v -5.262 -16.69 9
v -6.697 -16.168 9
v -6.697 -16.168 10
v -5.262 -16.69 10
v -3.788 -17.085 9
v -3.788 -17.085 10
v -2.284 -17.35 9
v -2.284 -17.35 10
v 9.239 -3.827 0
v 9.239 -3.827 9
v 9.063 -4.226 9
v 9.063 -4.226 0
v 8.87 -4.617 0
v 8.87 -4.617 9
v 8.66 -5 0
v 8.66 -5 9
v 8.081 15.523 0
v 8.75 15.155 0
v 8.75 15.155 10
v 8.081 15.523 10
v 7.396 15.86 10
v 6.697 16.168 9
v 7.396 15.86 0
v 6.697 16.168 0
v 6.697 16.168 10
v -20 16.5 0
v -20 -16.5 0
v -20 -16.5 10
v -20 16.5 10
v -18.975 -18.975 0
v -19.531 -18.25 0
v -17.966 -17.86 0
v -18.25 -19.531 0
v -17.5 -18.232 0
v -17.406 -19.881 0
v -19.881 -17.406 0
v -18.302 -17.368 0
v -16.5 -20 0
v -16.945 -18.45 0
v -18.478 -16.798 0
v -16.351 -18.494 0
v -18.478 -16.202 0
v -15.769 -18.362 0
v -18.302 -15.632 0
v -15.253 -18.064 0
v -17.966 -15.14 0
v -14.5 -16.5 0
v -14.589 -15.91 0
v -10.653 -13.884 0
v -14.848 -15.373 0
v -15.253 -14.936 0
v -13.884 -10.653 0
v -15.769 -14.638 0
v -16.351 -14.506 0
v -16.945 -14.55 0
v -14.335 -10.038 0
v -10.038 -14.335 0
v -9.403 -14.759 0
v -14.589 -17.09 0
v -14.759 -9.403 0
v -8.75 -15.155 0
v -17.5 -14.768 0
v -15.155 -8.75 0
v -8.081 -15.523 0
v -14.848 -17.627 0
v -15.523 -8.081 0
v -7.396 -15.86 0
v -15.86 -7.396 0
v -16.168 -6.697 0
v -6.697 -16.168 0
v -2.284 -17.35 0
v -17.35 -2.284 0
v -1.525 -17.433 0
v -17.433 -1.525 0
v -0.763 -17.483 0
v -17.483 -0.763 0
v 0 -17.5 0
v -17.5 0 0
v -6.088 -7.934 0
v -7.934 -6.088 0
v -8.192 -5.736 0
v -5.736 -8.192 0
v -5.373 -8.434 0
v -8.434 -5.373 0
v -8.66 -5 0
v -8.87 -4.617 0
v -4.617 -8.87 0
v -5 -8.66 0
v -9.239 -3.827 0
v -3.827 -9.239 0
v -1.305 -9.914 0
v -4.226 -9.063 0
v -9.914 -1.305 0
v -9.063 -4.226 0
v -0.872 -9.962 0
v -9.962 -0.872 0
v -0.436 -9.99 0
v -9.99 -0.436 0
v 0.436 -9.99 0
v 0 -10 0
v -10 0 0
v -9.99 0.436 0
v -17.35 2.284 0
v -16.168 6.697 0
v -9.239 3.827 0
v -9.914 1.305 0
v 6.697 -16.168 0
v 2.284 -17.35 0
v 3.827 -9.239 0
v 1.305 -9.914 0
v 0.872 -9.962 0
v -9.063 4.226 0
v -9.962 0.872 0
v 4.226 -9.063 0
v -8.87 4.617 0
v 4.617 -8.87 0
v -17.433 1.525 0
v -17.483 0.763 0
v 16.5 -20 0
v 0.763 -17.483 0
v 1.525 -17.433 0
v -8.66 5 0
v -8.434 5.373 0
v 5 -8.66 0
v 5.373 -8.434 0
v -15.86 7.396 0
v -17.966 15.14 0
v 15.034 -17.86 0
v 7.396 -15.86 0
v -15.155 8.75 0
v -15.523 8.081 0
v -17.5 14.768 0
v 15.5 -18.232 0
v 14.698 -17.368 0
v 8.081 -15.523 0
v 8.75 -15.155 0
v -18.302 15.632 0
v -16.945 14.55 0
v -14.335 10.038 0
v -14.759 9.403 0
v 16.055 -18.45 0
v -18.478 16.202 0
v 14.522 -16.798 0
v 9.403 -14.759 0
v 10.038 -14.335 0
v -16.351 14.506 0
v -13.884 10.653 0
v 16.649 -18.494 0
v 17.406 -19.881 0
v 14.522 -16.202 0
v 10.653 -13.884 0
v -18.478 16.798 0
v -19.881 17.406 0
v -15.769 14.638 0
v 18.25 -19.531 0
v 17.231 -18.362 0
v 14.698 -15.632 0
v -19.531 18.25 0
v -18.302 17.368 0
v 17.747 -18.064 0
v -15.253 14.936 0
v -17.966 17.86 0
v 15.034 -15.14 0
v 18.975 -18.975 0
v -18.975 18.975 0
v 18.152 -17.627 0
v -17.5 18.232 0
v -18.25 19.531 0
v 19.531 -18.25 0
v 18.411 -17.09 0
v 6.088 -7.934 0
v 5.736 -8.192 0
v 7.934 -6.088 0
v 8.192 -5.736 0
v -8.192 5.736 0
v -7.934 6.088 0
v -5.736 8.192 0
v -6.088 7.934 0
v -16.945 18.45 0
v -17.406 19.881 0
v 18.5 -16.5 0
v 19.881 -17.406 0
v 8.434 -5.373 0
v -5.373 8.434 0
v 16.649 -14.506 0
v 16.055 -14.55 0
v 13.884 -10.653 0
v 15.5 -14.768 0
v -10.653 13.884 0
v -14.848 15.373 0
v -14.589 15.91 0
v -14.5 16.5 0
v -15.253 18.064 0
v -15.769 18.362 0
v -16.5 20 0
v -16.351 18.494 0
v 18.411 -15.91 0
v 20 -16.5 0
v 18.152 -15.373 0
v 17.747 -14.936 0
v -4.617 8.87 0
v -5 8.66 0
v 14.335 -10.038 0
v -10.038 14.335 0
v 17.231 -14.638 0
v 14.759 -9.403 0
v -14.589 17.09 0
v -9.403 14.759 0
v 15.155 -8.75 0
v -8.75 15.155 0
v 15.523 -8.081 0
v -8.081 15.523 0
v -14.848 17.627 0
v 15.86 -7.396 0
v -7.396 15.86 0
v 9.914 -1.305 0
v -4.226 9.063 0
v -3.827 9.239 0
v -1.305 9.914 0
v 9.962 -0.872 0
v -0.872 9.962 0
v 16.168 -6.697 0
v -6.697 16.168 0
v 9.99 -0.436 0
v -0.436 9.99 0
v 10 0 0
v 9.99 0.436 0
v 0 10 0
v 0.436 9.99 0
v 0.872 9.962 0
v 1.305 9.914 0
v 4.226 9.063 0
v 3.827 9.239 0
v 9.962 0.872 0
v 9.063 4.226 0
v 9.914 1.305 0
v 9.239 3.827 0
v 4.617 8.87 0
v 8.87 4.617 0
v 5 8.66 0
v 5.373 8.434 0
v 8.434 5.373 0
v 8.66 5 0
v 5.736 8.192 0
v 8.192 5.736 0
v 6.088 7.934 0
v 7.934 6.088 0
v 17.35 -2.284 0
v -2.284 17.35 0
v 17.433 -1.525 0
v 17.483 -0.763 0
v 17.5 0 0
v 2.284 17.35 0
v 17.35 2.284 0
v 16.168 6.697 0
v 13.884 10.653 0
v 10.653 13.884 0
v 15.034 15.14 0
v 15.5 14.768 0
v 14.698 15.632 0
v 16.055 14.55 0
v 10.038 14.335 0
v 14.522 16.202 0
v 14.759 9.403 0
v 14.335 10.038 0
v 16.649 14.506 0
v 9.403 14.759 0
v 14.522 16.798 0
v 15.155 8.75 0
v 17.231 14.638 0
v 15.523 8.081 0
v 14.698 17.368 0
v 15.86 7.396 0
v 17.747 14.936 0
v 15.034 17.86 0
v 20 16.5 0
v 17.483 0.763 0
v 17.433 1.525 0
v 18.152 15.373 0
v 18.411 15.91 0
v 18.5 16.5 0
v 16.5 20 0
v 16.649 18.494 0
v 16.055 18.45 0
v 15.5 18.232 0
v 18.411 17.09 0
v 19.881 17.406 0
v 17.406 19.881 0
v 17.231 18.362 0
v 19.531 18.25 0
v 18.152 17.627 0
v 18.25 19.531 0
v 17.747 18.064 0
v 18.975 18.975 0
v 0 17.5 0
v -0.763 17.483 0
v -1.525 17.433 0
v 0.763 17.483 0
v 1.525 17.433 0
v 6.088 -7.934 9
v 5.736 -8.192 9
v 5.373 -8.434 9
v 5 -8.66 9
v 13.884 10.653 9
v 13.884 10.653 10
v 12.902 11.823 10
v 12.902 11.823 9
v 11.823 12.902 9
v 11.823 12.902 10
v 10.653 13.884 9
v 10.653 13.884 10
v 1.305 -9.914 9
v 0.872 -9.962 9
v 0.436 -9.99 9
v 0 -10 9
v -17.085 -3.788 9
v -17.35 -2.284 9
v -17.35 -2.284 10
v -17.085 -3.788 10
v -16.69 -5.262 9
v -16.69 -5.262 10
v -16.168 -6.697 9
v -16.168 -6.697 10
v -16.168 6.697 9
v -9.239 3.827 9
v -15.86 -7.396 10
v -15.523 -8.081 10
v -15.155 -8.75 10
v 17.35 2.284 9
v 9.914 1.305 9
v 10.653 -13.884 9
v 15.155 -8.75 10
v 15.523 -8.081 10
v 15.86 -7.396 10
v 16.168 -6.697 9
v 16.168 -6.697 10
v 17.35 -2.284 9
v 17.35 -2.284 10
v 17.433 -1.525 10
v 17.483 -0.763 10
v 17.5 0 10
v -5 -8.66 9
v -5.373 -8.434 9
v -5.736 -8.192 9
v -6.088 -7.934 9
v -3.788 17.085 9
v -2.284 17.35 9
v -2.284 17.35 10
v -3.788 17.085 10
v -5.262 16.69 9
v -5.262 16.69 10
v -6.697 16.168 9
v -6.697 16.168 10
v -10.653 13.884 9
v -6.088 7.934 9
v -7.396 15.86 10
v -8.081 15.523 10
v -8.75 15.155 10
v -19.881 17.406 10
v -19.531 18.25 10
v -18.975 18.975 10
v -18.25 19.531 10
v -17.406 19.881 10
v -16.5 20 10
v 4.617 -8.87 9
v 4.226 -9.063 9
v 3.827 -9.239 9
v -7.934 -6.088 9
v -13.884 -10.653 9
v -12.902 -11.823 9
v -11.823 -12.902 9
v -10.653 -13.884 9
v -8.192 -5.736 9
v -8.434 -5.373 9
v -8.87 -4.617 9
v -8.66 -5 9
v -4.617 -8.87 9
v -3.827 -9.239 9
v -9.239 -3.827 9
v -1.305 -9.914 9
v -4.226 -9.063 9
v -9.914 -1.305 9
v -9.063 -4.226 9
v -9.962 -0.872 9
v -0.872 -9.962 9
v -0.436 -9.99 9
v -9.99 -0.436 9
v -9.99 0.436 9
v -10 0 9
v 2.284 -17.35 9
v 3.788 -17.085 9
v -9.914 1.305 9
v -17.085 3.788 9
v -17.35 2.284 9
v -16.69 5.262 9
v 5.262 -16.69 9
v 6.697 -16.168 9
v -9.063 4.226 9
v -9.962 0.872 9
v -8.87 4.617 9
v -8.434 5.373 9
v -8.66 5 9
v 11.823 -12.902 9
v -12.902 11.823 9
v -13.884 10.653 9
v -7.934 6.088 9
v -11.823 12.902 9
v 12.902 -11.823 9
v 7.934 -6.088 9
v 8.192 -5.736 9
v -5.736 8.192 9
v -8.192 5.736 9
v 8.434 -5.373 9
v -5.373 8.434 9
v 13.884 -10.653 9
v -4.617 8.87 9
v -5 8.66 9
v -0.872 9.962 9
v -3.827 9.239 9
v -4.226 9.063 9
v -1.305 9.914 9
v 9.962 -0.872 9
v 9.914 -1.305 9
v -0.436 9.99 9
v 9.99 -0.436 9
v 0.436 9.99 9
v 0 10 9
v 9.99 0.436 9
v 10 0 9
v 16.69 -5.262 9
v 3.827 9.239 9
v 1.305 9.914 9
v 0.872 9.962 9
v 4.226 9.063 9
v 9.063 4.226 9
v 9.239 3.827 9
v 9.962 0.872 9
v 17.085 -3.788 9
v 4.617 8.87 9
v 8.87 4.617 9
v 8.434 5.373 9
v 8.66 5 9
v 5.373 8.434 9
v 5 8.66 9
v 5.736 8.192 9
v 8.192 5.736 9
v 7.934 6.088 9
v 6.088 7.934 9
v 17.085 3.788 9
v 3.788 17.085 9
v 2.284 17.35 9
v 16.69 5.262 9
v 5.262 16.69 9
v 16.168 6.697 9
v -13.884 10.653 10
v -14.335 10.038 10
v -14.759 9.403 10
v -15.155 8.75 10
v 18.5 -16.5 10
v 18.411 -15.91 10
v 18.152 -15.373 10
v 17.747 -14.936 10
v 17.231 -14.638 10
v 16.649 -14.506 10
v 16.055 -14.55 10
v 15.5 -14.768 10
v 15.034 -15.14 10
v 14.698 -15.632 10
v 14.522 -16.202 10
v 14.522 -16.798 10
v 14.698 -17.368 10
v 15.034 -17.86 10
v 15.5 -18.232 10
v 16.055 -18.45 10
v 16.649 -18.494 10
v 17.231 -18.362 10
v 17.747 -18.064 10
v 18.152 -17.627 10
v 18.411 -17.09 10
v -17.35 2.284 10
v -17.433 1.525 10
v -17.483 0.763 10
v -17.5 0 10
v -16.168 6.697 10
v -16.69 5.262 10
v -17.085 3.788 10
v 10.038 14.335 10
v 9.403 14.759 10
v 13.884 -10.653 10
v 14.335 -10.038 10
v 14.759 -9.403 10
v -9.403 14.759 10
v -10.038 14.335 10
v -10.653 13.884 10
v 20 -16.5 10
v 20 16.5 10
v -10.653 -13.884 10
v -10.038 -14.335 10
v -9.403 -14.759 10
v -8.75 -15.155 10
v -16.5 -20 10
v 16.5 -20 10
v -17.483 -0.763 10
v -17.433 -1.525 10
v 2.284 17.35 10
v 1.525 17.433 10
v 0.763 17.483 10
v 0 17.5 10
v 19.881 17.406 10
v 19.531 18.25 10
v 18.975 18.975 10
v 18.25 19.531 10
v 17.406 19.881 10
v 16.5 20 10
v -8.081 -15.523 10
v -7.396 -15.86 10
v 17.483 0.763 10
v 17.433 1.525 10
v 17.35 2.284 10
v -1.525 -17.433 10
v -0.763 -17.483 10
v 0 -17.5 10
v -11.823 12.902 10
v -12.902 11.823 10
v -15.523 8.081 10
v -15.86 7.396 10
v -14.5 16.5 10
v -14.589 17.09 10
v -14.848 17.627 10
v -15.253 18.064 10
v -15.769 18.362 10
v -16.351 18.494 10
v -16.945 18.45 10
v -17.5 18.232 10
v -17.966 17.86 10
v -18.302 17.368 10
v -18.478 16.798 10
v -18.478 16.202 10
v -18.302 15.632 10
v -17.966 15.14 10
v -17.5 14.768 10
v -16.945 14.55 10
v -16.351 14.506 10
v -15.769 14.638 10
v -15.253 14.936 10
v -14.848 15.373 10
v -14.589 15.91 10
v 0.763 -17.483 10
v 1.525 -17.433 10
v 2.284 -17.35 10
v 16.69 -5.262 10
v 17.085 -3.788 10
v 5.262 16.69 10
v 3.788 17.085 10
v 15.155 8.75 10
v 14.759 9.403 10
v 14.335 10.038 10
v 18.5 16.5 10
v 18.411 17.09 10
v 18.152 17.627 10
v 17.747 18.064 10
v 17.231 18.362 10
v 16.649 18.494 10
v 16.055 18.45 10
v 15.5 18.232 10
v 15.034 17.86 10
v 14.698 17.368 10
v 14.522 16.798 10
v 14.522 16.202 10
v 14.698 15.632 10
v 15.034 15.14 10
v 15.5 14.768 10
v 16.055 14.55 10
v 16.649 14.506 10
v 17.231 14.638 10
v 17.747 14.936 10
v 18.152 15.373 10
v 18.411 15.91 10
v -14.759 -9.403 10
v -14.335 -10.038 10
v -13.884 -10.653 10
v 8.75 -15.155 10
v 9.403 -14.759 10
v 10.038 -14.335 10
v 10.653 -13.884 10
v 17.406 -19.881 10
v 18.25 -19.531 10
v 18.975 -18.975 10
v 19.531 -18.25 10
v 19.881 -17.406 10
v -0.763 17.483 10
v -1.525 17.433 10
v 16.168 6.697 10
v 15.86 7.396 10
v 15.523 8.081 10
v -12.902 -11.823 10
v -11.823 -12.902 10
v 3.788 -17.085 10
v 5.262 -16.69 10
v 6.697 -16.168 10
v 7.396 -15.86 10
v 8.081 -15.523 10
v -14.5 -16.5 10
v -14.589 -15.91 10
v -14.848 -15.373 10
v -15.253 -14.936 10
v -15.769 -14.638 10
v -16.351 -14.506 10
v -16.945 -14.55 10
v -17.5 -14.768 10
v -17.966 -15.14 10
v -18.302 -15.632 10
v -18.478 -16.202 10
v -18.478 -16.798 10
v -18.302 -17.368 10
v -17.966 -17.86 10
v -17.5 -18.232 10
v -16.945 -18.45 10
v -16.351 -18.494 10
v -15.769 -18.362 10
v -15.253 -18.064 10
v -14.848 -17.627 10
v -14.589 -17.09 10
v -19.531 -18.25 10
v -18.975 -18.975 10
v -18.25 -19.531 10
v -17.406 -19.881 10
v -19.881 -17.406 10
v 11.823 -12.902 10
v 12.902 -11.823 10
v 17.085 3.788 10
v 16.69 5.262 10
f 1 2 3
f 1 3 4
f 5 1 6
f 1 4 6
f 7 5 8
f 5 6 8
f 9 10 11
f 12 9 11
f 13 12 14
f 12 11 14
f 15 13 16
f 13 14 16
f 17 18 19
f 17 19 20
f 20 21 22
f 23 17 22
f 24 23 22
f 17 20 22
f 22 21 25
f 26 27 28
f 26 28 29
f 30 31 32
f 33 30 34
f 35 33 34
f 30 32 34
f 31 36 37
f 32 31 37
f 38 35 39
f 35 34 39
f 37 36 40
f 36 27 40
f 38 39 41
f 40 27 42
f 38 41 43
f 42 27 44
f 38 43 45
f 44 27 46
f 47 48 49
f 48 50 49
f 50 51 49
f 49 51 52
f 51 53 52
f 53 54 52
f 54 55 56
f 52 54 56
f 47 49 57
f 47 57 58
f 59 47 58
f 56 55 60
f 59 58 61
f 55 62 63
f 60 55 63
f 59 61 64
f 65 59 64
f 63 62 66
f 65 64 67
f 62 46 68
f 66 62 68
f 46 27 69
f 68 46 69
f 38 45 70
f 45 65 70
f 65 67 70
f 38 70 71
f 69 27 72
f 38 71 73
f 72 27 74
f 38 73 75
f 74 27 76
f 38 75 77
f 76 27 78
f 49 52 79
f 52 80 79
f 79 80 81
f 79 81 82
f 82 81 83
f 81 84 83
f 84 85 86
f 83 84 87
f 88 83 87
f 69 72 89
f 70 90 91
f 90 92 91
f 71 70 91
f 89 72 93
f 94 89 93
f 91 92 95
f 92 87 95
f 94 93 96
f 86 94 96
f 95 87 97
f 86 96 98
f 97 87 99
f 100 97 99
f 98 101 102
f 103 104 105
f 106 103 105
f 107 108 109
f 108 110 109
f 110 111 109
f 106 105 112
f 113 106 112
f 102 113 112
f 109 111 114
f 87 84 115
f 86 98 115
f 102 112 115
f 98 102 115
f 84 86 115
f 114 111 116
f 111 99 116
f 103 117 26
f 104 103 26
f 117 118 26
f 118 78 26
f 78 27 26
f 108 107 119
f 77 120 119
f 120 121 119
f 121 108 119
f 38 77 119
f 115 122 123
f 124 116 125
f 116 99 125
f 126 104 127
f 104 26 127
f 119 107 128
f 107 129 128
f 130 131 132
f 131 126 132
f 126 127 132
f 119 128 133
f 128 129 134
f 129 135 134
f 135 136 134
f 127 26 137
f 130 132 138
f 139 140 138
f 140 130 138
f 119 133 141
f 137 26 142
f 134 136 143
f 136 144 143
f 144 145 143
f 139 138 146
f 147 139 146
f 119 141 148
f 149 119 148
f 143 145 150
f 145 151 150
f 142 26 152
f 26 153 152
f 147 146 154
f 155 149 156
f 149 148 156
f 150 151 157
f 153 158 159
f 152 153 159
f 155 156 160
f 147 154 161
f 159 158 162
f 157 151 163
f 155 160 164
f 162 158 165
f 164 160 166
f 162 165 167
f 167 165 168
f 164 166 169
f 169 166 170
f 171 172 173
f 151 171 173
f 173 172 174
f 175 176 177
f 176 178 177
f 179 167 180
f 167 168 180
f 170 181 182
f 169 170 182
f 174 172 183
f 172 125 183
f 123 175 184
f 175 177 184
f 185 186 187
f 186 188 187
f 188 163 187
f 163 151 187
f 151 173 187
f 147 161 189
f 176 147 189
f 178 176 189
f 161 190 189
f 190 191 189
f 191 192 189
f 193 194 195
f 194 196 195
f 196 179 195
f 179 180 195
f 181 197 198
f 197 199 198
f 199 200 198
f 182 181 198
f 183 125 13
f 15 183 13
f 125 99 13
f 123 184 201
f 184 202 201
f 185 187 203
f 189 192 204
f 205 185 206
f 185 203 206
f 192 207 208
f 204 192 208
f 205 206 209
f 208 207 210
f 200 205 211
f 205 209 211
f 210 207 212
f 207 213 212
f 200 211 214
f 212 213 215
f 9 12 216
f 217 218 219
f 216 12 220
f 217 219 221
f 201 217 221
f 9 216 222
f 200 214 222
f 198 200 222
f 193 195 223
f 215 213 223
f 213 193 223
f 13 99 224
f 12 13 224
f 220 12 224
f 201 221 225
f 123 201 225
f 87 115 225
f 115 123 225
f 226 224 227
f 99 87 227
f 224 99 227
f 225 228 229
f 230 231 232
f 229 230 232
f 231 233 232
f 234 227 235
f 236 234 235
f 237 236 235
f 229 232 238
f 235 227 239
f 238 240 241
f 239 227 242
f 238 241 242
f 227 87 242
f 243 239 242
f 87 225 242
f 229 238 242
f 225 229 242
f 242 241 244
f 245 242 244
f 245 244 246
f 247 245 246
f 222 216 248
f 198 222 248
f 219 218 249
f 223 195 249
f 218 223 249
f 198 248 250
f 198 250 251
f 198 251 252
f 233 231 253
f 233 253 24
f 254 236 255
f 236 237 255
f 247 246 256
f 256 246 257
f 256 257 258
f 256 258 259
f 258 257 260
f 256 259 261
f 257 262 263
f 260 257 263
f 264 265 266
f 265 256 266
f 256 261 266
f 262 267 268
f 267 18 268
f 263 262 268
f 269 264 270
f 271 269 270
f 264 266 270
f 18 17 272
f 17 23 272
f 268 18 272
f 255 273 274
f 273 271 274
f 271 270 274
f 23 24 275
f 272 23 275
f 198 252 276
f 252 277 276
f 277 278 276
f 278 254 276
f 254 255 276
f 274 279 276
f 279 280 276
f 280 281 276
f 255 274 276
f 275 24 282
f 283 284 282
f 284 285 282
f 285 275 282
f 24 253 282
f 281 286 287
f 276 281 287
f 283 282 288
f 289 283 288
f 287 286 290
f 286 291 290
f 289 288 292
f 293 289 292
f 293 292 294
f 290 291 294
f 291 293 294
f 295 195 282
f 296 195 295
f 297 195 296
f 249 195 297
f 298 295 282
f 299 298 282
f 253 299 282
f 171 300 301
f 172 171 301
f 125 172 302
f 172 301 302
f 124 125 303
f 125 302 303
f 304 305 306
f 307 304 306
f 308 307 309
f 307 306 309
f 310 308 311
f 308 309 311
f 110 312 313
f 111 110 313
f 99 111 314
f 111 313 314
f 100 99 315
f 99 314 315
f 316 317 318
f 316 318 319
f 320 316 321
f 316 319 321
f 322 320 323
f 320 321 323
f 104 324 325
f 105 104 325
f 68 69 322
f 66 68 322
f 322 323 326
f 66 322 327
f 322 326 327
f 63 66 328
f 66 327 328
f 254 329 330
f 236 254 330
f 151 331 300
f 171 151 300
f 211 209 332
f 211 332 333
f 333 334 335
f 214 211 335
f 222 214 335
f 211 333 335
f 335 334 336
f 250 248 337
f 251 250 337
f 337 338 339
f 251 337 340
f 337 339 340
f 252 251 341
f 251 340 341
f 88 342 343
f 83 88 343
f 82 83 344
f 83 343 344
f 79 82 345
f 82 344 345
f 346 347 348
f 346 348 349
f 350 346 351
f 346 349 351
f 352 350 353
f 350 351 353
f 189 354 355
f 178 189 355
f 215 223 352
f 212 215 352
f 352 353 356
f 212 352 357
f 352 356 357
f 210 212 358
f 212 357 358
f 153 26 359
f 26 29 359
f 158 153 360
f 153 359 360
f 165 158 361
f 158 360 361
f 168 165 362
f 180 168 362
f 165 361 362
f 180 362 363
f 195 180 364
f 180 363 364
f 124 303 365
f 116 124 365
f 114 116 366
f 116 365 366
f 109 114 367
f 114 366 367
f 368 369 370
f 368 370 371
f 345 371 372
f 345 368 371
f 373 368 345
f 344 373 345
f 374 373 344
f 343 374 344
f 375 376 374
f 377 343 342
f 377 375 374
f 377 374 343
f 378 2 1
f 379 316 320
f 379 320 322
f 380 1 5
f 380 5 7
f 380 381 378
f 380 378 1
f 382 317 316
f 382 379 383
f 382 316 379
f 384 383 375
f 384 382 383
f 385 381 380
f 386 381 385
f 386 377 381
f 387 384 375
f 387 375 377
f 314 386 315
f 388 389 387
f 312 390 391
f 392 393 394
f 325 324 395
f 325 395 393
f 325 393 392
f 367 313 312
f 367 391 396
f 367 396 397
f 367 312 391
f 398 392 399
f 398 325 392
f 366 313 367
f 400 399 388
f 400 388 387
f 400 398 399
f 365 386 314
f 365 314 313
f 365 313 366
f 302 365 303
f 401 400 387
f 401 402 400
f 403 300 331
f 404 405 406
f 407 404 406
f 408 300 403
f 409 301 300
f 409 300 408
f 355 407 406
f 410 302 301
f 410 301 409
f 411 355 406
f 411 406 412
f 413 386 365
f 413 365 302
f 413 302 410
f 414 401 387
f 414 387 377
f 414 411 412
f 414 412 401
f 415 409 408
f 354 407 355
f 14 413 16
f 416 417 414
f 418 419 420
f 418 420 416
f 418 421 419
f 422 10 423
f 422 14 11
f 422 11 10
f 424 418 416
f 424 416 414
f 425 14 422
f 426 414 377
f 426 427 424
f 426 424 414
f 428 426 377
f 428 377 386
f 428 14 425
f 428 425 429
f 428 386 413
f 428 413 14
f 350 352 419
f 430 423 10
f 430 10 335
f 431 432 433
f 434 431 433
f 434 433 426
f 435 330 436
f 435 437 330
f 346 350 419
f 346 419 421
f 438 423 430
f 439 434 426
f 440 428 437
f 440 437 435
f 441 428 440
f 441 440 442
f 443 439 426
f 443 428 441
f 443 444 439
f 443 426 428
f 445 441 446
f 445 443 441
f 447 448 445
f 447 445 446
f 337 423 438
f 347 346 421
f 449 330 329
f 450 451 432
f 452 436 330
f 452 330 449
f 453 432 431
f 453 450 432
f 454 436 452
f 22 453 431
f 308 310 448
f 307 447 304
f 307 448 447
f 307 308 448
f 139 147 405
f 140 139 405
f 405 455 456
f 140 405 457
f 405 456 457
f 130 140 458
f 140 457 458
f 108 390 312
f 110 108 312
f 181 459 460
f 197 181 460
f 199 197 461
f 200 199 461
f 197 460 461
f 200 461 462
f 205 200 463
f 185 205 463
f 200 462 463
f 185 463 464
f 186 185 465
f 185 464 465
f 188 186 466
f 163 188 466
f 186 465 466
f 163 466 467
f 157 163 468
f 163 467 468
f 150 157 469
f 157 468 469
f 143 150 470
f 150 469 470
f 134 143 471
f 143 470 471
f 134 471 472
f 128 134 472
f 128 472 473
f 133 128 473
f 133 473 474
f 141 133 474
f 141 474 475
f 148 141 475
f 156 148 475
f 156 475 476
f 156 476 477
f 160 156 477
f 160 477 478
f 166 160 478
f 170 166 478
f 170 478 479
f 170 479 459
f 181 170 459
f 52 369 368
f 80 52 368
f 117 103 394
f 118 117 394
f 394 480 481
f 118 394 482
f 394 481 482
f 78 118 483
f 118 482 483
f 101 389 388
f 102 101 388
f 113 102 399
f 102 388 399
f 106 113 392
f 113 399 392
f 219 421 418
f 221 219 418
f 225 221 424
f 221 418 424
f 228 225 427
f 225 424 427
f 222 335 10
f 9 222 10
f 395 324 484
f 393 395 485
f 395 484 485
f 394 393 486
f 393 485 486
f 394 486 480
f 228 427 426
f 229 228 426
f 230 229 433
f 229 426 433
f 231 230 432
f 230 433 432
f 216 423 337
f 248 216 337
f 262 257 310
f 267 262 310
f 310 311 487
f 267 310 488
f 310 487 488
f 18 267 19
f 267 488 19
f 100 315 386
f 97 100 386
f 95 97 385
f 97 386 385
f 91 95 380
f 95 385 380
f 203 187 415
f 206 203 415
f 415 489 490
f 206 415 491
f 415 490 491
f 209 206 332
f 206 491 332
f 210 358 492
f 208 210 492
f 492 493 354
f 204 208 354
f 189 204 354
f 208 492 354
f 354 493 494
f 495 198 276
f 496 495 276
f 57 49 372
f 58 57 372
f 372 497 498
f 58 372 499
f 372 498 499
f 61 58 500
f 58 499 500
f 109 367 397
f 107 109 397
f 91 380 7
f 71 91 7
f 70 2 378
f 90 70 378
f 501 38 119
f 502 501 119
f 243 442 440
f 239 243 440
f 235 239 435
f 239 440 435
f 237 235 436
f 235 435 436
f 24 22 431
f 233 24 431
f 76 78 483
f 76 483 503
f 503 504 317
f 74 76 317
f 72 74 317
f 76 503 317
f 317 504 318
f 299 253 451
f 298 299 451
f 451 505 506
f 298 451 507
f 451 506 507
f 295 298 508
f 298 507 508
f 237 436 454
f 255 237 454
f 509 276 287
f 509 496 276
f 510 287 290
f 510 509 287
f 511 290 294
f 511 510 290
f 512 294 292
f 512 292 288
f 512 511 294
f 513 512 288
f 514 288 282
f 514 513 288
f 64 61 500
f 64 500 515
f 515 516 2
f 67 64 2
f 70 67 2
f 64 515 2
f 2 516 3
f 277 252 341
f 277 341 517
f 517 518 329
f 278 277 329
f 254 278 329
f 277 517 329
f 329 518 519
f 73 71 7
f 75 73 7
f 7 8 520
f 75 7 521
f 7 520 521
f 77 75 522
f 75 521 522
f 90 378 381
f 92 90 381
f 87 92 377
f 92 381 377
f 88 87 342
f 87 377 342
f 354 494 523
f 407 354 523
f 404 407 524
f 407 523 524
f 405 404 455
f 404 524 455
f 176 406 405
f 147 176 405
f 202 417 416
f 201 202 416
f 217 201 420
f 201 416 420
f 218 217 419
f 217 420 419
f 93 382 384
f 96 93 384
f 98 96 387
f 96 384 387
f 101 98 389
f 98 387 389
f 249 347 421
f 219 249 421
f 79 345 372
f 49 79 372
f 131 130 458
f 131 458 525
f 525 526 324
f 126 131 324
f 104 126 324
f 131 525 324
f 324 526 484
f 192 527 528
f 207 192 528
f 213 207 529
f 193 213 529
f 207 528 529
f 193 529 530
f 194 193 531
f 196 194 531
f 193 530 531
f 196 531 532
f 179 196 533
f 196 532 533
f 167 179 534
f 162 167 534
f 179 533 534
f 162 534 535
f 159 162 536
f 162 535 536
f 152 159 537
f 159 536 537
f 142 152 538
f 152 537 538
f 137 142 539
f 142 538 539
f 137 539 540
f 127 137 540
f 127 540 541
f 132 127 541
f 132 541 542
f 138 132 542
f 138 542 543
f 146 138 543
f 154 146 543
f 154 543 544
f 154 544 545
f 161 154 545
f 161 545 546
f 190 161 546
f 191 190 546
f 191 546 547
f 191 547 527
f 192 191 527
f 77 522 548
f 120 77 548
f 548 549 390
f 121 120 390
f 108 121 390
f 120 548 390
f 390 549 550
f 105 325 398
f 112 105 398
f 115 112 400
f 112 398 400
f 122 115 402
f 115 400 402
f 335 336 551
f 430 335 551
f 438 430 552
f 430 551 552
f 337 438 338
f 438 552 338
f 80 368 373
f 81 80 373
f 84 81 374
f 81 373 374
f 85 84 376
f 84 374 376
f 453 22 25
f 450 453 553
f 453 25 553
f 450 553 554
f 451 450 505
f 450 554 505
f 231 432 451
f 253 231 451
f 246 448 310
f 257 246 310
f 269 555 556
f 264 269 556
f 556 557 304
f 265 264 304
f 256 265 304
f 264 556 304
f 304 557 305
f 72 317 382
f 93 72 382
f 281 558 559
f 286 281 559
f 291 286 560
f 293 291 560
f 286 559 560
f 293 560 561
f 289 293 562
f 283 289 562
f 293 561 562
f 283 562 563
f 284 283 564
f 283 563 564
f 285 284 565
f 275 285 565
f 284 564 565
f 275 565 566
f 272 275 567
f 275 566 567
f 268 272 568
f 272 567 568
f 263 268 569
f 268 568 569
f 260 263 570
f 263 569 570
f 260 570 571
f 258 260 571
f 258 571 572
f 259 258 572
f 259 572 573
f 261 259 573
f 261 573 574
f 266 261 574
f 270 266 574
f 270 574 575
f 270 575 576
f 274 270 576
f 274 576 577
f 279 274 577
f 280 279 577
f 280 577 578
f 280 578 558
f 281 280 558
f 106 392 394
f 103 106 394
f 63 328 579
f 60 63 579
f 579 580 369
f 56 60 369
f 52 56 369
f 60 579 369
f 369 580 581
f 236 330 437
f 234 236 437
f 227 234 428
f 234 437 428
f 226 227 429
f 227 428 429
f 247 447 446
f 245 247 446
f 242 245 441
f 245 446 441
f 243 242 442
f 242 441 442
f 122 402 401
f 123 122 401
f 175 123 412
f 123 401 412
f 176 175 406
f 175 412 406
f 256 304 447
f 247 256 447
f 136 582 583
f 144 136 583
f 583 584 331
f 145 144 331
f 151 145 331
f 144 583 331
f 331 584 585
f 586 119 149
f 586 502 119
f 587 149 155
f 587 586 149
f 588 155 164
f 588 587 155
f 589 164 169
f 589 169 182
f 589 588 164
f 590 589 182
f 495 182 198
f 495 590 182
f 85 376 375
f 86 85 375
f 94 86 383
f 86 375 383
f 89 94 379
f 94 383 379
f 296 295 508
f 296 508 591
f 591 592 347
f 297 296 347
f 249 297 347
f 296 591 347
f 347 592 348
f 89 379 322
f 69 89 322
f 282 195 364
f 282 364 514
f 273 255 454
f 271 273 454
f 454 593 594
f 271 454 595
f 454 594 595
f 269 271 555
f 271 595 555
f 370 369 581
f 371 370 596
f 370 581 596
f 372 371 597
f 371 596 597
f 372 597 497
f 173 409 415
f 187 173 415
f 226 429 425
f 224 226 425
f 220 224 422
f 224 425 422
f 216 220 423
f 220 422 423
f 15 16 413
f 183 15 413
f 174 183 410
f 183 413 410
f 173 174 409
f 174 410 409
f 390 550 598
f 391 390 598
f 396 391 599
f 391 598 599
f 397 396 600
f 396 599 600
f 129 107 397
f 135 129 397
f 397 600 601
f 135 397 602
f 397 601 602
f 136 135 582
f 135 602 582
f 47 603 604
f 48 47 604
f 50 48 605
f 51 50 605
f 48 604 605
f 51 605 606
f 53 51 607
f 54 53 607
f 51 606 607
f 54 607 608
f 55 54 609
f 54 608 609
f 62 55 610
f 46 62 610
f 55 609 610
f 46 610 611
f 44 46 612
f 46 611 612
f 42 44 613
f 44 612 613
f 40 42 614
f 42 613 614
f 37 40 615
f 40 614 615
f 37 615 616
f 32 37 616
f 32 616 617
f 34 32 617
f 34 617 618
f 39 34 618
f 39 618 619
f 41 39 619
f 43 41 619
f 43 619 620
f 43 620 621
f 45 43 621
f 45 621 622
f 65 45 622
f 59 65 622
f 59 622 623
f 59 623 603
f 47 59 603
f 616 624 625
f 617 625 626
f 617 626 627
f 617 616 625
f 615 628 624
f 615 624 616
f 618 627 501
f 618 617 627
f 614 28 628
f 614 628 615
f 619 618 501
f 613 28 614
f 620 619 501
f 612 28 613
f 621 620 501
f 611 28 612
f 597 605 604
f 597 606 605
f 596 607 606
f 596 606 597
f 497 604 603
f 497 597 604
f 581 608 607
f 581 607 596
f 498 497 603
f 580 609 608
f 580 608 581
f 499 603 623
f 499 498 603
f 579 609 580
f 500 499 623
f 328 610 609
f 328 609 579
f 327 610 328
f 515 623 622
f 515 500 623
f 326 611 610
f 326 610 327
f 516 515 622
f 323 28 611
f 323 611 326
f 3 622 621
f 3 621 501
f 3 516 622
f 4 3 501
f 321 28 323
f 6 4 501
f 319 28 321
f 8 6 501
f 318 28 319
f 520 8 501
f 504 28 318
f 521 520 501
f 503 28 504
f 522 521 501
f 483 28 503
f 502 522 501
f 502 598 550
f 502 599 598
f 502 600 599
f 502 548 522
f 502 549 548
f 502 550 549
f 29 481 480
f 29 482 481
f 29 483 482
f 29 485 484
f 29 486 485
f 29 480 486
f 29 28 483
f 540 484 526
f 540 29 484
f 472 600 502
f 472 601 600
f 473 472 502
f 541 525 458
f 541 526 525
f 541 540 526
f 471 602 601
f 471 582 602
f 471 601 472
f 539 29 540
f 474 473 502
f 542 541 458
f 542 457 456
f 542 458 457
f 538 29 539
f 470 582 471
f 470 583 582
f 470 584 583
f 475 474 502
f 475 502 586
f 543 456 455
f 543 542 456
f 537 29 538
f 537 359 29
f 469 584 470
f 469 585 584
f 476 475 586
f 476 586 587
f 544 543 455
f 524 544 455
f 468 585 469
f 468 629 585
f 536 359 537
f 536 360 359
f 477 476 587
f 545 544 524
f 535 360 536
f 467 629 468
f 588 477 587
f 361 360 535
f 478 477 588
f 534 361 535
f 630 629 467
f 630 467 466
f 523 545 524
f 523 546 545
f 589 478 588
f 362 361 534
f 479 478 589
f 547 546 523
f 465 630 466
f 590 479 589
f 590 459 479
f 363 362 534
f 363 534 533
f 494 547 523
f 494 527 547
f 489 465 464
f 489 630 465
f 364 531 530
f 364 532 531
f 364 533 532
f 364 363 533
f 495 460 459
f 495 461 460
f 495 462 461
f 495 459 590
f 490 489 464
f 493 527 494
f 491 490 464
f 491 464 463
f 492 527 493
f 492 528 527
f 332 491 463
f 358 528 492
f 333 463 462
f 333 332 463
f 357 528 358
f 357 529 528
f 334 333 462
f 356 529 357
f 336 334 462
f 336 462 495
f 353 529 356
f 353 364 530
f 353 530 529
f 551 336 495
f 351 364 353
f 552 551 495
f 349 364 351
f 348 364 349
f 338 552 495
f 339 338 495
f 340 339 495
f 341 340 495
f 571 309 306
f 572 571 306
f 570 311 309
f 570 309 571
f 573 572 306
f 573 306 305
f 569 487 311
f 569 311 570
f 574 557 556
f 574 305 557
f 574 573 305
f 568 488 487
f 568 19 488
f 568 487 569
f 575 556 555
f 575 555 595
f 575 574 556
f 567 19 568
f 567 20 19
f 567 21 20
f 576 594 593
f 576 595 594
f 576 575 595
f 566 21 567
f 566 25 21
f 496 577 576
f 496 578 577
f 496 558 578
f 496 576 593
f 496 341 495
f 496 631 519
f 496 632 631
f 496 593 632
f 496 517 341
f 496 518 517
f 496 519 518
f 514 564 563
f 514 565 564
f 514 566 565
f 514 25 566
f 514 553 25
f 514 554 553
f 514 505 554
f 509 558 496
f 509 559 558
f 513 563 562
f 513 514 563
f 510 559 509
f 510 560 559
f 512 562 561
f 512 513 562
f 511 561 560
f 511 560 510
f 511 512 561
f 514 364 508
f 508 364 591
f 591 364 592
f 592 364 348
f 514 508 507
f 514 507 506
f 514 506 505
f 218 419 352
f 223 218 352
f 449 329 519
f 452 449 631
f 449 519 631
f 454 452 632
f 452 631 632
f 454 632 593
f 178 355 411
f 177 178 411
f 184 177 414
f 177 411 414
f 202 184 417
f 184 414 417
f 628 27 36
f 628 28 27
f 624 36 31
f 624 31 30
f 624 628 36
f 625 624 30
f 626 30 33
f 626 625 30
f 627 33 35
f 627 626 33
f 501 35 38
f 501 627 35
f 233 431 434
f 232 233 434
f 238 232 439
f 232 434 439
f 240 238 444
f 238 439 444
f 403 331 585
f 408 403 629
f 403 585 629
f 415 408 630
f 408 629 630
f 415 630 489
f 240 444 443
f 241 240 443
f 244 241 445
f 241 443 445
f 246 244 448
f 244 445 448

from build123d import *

# Parameters (mm, degrees)
SKETCH1_W           = 40
SKETCH1_H           = 40
BOSS_EXTRUDE1_DEPTH = 10
FILLET1_R           = 3.5
SKETCH2_R           = 2
CUT_EXTRUDE1_DEPTH  = 11
CUT_EXTRUDE2_DEPTH  = 11
CIRPATTERN1_COUNT   = 12
SKETCH6_R           = 17.5
CUT_EXTRUDE3_DEPTH  = 1


with BuildPart() as part:
    # Sketch1 → Boss-Extrude1 (new body)
    with BuildSketch(Plane.XY):
        Rectangle(SKETCH1_W, SKETCH1_H)
    extrude(amount=BOSS_EXTRUDE1_DEPTH)

    # Fillet1
    fillet1_edges = [part.edges().sort_by_distance(p)[0] for p in [
        (20, -20, 5),
        (-20, -20, 5),
        (-20, 20, 5),
        (20, 20, 5),
    ]]
    fillet(fillet1_edges, radius=FILLET1_R)

    # Sketch2 → Cut-Extrude1 (cut, through all)
    with BuildSketch(Plane.XY.offset(10)):
        with Locations((16.5, -16.5)):
            Circle(SKETCH2_R)
        with Locations((16.5, 16.5)):
            Circle(SKETCH2_R)
        with Locations((-16.5, 16.5)):
            Circle(SKETCH2_R)
        with Locations((-16.5, -16.5)):
            Circle(SKETCH2_R)
    extrude(amount=-CUT_EXTRUDE1_DEPTH, mode=Mode.SUBTRACT)

    # Sketch5 → Cut-Extrude2 (cut, through all)
    with BuildSketch(Plane.XY.offset(10)):
        with BuildLine():
            Line((17.350285074, 2.284208364), (9.914448614, 1.305261922))
            ThreePointArc((9.914448614, 1.305261922), (9.978589232, 0.654031292), (10, 0))
            ThreePointArc((10, 0), (9.978589232, -0.654031292), (9.914448614, -1.305261922))
            Line((9.914448614, -1.305261922), (17.350285074, -2.284208364))
            ThreePointArc((17.350285074, -2.284208364), (17.462531157, -1.144554762), (17.5, 0))
            ThreePointArc((17.5, 0), (17.462531157, 1.144554762), (17.350285074, 2.284208364))
        make_face()
    cut_extrude2 = extrude(amount=-CUT_EXTRUDE2_DEPTH, mode=Mode.SUBTRACT)

    # CirPattern1: Cut-Extrude2 ×12 about axis
    cirpattern1_axis = Axis((0, 0, 0), (0, 0, 1))
    for i in range(1, CIRPATTERN1_COUNT):
        add(cut_extrude2.rotate(cirpattern1_axis, i * 360 / CIRPATTERN1_COUNT), mode=Mode.SUBTRACT)

    # Sketch6 → Cut-Extrude3 (cut)
    with BuildSketch(Plane.XY.offset(10)):
        Circle(SKETCH6_R)
    extrude(amount=-CUT_EXTRUDE3_DEPTH, mode=Mode.SUBTRACT)


solid = part.part
